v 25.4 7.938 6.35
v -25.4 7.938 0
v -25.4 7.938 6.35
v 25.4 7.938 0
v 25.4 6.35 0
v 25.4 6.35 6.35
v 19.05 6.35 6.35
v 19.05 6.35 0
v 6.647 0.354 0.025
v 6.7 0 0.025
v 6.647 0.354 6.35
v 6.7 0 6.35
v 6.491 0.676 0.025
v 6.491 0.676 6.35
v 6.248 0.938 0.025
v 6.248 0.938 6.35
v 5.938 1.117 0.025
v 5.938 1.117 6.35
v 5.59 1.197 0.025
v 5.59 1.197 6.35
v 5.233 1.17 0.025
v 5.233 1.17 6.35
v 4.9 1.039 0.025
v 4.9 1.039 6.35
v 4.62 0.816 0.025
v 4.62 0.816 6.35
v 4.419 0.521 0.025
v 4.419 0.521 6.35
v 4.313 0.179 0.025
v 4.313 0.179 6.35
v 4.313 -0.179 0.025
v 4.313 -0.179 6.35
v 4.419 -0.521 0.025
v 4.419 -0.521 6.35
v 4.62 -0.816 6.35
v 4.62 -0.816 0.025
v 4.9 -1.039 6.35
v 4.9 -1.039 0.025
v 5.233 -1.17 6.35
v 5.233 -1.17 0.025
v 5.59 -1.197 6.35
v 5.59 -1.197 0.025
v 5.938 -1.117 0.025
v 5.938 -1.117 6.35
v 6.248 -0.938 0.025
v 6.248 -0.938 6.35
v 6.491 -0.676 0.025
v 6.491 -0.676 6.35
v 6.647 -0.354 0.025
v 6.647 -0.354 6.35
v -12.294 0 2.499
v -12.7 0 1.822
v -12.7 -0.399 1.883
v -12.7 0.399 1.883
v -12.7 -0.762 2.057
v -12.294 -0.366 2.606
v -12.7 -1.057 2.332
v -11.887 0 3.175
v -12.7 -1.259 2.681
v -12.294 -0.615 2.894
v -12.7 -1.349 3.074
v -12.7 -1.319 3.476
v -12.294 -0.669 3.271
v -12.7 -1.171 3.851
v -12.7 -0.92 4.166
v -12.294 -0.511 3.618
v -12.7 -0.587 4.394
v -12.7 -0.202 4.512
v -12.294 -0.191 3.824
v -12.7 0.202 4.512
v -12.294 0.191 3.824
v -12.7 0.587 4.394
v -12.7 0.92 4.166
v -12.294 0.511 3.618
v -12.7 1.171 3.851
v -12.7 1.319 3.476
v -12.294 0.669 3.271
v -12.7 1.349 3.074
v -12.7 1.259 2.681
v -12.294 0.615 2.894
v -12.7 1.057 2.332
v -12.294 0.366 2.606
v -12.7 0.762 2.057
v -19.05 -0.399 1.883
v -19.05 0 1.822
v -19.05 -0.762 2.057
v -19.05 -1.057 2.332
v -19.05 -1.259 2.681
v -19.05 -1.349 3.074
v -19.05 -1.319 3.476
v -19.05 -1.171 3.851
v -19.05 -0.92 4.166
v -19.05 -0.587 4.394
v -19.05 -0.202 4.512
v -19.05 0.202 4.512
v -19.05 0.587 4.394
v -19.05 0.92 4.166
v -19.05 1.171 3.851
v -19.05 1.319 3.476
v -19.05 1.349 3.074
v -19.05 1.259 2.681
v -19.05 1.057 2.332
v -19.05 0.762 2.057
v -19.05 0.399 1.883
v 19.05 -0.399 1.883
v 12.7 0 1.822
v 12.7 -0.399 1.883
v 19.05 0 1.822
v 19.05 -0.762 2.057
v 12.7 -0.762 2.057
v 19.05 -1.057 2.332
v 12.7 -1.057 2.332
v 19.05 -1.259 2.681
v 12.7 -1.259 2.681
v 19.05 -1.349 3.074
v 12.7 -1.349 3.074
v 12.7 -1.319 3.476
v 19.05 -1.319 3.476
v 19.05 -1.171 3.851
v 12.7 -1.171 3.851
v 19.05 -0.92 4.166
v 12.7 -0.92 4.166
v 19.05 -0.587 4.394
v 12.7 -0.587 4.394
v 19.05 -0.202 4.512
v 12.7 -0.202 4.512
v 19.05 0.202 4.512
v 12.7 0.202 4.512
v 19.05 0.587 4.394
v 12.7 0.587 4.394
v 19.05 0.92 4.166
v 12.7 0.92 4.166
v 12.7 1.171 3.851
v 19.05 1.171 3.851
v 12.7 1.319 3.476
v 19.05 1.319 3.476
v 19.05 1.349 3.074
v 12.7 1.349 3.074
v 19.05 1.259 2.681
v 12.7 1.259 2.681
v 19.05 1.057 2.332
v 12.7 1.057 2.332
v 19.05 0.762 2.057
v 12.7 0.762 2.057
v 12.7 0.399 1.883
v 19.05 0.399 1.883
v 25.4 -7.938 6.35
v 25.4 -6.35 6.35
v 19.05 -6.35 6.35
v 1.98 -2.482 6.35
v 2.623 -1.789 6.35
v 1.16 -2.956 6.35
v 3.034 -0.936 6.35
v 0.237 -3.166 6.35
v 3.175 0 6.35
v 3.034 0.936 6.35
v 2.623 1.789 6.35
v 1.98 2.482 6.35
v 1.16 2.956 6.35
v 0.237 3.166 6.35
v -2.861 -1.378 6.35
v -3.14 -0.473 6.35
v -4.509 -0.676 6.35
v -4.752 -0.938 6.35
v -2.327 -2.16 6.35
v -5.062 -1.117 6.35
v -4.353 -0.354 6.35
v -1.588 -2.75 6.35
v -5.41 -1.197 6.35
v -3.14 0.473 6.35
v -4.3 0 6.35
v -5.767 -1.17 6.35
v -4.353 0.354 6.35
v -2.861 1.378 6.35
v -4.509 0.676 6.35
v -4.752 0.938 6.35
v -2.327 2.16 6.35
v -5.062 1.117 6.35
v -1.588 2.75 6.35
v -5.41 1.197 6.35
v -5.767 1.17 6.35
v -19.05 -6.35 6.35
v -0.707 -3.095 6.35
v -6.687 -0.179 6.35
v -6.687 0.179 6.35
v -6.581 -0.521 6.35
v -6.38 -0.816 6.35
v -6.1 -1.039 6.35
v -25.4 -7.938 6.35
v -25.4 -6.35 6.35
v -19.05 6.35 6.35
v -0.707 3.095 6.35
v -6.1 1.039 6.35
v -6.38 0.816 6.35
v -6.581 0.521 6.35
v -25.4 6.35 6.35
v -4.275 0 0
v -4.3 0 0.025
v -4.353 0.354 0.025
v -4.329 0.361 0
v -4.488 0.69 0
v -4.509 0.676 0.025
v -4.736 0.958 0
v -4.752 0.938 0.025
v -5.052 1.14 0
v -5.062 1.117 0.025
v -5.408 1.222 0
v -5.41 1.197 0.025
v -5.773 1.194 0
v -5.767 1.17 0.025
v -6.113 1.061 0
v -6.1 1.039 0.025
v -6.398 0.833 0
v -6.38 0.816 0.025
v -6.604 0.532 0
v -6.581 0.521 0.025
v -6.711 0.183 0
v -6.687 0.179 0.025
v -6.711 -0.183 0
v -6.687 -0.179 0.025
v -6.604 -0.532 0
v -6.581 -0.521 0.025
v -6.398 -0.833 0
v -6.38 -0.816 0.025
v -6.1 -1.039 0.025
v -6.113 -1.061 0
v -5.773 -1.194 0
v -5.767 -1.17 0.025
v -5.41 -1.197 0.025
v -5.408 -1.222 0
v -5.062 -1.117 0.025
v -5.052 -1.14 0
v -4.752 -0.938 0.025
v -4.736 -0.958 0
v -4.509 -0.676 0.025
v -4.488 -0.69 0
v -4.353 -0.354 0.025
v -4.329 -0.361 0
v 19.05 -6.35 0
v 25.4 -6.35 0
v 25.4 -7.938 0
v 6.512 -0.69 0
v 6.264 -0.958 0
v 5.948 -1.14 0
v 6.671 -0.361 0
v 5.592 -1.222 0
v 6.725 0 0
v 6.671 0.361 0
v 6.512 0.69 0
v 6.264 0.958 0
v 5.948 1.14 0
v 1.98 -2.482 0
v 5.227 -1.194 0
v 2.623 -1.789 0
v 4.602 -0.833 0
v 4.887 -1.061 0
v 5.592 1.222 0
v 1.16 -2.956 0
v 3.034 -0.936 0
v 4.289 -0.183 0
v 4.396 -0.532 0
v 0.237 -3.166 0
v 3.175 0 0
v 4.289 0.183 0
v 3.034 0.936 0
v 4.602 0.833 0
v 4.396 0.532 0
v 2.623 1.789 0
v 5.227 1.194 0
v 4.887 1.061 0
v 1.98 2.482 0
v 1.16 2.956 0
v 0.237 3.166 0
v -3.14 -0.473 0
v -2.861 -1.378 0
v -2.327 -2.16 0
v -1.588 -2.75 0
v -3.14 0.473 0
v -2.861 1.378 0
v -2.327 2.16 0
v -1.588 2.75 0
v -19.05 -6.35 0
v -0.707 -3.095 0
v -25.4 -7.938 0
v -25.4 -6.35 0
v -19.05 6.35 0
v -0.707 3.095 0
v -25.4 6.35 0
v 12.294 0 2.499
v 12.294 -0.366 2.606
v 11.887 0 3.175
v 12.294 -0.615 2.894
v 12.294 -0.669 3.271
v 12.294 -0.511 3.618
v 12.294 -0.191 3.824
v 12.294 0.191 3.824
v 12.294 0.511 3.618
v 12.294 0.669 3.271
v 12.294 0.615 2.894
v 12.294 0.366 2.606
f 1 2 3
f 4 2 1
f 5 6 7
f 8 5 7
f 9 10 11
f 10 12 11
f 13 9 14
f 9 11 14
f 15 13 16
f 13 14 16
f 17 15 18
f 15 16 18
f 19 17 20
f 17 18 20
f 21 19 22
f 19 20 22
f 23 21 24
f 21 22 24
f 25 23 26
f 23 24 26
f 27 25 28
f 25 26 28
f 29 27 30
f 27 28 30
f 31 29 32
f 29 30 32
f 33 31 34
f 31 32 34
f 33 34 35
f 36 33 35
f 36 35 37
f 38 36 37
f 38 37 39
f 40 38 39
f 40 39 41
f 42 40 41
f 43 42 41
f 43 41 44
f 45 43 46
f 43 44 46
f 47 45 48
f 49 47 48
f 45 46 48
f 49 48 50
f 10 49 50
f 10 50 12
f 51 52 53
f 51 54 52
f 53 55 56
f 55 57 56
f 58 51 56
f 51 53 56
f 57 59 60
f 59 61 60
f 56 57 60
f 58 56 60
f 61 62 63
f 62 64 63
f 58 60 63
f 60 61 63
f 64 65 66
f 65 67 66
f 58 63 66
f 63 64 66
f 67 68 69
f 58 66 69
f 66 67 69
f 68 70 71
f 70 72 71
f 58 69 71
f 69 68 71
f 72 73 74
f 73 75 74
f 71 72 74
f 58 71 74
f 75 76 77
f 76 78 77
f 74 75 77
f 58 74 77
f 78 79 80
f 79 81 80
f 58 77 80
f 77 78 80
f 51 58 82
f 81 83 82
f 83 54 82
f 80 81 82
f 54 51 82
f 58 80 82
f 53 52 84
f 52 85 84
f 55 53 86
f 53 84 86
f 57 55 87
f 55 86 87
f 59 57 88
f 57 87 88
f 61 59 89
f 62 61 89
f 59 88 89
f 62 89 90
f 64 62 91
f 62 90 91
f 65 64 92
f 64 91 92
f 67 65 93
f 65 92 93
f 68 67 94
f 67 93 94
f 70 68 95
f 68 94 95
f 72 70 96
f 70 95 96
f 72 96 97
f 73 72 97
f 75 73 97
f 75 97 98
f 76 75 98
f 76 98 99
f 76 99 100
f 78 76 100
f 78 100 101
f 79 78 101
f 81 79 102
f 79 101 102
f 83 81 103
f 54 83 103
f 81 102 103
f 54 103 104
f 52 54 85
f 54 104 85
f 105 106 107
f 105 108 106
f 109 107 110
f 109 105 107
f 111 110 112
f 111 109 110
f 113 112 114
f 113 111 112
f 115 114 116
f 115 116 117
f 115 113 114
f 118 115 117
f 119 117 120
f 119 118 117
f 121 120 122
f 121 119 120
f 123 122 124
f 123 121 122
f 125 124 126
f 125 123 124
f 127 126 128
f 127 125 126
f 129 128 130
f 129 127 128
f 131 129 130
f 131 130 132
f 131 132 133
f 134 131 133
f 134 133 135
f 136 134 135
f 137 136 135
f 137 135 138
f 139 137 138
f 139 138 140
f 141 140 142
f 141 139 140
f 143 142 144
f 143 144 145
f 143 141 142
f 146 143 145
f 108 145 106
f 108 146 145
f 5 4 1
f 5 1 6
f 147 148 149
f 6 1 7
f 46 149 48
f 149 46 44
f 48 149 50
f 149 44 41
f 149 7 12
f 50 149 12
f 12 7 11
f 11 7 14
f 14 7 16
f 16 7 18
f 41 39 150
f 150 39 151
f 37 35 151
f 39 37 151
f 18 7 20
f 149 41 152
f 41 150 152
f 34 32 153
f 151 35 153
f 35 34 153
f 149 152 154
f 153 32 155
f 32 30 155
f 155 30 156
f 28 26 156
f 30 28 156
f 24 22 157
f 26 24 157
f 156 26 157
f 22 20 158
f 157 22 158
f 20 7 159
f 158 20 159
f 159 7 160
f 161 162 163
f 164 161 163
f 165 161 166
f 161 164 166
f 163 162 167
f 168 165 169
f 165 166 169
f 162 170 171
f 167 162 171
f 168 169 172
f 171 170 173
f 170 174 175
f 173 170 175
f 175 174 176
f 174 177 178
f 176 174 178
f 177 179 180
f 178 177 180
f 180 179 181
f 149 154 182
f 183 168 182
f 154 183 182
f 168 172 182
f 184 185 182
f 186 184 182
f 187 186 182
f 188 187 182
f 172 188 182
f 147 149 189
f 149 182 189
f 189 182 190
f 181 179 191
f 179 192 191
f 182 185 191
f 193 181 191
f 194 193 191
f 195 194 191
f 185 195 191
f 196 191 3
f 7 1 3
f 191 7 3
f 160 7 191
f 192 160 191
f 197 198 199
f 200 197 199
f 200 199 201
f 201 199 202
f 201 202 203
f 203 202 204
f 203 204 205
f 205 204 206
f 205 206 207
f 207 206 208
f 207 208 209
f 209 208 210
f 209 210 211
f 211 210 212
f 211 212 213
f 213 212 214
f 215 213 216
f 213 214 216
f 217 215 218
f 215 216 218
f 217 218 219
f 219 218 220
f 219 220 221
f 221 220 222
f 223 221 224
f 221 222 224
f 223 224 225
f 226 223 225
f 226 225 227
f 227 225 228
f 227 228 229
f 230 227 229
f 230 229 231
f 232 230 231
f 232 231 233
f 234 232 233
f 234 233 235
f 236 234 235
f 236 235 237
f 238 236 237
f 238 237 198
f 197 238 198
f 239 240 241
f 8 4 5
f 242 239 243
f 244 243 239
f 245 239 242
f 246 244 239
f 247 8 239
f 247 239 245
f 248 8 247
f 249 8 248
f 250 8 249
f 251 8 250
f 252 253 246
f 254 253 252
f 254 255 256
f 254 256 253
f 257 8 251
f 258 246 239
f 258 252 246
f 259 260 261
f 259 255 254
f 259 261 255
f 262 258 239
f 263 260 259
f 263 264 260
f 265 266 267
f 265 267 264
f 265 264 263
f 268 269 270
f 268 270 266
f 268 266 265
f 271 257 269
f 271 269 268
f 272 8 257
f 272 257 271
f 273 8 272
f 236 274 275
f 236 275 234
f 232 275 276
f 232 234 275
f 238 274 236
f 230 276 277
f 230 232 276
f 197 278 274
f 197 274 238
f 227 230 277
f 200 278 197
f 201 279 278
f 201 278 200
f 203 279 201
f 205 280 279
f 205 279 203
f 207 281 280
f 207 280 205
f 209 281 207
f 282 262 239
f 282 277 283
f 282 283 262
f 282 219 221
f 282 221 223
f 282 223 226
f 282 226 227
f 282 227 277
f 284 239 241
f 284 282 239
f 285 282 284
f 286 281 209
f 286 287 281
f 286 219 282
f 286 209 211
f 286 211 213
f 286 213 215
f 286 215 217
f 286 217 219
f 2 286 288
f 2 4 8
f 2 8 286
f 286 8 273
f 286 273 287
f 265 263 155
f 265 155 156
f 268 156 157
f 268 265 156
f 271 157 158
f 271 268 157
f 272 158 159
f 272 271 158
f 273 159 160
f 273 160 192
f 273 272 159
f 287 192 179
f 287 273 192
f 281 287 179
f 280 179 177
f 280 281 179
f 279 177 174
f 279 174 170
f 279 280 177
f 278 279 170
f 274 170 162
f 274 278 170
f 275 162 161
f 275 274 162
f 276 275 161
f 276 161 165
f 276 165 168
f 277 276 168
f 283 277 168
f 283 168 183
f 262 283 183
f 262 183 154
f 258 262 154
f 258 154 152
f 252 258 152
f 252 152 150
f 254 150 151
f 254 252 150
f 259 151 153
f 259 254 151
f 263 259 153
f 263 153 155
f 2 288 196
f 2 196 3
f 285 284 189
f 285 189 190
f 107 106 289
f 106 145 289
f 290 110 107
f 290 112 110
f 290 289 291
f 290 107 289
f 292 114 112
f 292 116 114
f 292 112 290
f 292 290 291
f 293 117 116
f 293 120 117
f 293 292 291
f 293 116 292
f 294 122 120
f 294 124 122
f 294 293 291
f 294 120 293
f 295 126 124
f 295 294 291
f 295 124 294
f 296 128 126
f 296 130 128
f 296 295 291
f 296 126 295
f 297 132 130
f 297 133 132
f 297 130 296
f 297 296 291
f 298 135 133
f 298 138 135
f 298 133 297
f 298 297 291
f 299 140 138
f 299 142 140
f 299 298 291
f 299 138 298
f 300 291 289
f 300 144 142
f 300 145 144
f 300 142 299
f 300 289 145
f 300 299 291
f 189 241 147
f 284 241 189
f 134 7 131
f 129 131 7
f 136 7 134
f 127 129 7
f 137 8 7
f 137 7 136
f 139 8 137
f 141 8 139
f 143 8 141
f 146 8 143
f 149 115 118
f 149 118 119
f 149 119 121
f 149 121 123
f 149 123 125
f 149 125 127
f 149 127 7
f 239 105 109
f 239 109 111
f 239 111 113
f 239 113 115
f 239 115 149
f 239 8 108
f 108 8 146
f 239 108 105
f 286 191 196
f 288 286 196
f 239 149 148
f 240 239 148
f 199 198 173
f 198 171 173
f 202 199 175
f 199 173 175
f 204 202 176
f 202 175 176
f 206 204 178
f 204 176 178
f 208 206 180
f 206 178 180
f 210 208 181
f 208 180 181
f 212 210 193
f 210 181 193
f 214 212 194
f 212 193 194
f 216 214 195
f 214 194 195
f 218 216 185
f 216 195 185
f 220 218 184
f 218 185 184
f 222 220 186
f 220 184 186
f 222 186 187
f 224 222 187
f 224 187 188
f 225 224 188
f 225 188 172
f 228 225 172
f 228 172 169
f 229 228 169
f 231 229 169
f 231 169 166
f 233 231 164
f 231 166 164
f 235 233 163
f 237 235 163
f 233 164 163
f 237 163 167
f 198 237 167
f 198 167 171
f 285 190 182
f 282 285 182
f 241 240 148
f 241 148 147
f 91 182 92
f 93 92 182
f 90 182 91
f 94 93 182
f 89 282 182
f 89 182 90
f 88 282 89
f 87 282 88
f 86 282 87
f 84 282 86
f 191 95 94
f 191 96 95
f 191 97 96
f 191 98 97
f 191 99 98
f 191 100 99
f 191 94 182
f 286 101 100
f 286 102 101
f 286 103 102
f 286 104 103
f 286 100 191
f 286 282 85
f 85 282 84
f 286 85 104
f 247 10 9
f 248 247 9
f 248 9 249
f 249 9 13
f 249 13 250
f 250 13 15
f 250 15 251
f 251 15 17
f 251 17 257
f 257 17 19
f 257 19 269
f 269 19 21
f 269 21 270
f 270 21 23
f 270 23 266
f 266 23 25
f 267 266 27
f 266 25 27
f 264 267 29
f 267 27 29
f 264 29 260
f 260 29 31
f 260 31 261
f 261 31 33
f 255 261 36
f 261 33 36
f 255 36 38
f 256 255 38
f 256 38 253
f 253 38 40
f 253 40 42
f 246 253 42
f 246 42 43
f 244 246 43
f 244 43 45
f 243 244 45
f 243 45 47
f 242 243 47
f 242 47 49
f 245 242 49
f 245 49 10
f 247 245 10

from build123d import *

# Parameters (mm, degrees)
SKETCH1_R                      = 3.175
BOSS_EXTRUDE1_DEPTH            = 6.35
M2_CLEARANCE_HOLE1_D           = 2.4
M2_CLEARANCE_HOLE1_CSINK_D     = 2.45
M2_CLEARANCE_HOLE1_CSINK_ANGLE = 90


with BuildPart() as part:
    # Sketch1 → Boss-Extrude1 (new body)
    with BuildSketch(Plane.XY):
        Polygon((25.4, -6.35), (25.4, -7.9375), (-25.4, -7.9375), (-25.4, -6.35), (-19.05, -6.35), (-19.05, 6.35), (-25.4, 6.35), (-25.4, 7.9375), (25.4, 7.9375), (25.4, 6.35), (19.05, 6.35), (19.05, -6.35), align=None)
        Circle(SKETCH1_R, mode=Mode.SUBTRACT)
    extrude(amount=BOSS_EXTRUDE1_DEPTH)

    # Sketch4 → Tap Drill for #6-32 Tap1 (revolve, cut)
    with BuildSketch(Plane(origin=(19.05, 0, 3.175), x_dir=(0, 0, -1), z_dir=(0, 1, 0))):
        Polygon((0, 0), (0, 7.16269403), (1.35255, 6.35), (1.35255, 0), align=None)
    tap_drill_for_6_32_tap1 = revolve(axis=Axis((25.4, 0, 3.175), (-1, 0, 0)), mode=Mode.SUBTRACT)

    # M2 Clearance Hole1 (through all)
    with Locations(Plane(origin=(0, 0, 0), x_dir=(-1, 0, 0), z_dir=(0, 0, -1))):
        with Locations((-5.5, 0), (5.5, 0)):
            CounterSinkHole(M2_CLEARANCE_HOLE1_D / 2, M2_CLEARANCE_HOLE1_CSINK_D / 2, counter_sink_angle=M2_CLEARANCE_HOLE1_CSINK_ANGLE)

    # Mirror1: Tap Drill for #6-32 Tap1 across plane
    add(tap_drill_for_6_32_tap1.mirror(Plane.ZY), mode=Mode.SUBTRACT)


solid = part.part
